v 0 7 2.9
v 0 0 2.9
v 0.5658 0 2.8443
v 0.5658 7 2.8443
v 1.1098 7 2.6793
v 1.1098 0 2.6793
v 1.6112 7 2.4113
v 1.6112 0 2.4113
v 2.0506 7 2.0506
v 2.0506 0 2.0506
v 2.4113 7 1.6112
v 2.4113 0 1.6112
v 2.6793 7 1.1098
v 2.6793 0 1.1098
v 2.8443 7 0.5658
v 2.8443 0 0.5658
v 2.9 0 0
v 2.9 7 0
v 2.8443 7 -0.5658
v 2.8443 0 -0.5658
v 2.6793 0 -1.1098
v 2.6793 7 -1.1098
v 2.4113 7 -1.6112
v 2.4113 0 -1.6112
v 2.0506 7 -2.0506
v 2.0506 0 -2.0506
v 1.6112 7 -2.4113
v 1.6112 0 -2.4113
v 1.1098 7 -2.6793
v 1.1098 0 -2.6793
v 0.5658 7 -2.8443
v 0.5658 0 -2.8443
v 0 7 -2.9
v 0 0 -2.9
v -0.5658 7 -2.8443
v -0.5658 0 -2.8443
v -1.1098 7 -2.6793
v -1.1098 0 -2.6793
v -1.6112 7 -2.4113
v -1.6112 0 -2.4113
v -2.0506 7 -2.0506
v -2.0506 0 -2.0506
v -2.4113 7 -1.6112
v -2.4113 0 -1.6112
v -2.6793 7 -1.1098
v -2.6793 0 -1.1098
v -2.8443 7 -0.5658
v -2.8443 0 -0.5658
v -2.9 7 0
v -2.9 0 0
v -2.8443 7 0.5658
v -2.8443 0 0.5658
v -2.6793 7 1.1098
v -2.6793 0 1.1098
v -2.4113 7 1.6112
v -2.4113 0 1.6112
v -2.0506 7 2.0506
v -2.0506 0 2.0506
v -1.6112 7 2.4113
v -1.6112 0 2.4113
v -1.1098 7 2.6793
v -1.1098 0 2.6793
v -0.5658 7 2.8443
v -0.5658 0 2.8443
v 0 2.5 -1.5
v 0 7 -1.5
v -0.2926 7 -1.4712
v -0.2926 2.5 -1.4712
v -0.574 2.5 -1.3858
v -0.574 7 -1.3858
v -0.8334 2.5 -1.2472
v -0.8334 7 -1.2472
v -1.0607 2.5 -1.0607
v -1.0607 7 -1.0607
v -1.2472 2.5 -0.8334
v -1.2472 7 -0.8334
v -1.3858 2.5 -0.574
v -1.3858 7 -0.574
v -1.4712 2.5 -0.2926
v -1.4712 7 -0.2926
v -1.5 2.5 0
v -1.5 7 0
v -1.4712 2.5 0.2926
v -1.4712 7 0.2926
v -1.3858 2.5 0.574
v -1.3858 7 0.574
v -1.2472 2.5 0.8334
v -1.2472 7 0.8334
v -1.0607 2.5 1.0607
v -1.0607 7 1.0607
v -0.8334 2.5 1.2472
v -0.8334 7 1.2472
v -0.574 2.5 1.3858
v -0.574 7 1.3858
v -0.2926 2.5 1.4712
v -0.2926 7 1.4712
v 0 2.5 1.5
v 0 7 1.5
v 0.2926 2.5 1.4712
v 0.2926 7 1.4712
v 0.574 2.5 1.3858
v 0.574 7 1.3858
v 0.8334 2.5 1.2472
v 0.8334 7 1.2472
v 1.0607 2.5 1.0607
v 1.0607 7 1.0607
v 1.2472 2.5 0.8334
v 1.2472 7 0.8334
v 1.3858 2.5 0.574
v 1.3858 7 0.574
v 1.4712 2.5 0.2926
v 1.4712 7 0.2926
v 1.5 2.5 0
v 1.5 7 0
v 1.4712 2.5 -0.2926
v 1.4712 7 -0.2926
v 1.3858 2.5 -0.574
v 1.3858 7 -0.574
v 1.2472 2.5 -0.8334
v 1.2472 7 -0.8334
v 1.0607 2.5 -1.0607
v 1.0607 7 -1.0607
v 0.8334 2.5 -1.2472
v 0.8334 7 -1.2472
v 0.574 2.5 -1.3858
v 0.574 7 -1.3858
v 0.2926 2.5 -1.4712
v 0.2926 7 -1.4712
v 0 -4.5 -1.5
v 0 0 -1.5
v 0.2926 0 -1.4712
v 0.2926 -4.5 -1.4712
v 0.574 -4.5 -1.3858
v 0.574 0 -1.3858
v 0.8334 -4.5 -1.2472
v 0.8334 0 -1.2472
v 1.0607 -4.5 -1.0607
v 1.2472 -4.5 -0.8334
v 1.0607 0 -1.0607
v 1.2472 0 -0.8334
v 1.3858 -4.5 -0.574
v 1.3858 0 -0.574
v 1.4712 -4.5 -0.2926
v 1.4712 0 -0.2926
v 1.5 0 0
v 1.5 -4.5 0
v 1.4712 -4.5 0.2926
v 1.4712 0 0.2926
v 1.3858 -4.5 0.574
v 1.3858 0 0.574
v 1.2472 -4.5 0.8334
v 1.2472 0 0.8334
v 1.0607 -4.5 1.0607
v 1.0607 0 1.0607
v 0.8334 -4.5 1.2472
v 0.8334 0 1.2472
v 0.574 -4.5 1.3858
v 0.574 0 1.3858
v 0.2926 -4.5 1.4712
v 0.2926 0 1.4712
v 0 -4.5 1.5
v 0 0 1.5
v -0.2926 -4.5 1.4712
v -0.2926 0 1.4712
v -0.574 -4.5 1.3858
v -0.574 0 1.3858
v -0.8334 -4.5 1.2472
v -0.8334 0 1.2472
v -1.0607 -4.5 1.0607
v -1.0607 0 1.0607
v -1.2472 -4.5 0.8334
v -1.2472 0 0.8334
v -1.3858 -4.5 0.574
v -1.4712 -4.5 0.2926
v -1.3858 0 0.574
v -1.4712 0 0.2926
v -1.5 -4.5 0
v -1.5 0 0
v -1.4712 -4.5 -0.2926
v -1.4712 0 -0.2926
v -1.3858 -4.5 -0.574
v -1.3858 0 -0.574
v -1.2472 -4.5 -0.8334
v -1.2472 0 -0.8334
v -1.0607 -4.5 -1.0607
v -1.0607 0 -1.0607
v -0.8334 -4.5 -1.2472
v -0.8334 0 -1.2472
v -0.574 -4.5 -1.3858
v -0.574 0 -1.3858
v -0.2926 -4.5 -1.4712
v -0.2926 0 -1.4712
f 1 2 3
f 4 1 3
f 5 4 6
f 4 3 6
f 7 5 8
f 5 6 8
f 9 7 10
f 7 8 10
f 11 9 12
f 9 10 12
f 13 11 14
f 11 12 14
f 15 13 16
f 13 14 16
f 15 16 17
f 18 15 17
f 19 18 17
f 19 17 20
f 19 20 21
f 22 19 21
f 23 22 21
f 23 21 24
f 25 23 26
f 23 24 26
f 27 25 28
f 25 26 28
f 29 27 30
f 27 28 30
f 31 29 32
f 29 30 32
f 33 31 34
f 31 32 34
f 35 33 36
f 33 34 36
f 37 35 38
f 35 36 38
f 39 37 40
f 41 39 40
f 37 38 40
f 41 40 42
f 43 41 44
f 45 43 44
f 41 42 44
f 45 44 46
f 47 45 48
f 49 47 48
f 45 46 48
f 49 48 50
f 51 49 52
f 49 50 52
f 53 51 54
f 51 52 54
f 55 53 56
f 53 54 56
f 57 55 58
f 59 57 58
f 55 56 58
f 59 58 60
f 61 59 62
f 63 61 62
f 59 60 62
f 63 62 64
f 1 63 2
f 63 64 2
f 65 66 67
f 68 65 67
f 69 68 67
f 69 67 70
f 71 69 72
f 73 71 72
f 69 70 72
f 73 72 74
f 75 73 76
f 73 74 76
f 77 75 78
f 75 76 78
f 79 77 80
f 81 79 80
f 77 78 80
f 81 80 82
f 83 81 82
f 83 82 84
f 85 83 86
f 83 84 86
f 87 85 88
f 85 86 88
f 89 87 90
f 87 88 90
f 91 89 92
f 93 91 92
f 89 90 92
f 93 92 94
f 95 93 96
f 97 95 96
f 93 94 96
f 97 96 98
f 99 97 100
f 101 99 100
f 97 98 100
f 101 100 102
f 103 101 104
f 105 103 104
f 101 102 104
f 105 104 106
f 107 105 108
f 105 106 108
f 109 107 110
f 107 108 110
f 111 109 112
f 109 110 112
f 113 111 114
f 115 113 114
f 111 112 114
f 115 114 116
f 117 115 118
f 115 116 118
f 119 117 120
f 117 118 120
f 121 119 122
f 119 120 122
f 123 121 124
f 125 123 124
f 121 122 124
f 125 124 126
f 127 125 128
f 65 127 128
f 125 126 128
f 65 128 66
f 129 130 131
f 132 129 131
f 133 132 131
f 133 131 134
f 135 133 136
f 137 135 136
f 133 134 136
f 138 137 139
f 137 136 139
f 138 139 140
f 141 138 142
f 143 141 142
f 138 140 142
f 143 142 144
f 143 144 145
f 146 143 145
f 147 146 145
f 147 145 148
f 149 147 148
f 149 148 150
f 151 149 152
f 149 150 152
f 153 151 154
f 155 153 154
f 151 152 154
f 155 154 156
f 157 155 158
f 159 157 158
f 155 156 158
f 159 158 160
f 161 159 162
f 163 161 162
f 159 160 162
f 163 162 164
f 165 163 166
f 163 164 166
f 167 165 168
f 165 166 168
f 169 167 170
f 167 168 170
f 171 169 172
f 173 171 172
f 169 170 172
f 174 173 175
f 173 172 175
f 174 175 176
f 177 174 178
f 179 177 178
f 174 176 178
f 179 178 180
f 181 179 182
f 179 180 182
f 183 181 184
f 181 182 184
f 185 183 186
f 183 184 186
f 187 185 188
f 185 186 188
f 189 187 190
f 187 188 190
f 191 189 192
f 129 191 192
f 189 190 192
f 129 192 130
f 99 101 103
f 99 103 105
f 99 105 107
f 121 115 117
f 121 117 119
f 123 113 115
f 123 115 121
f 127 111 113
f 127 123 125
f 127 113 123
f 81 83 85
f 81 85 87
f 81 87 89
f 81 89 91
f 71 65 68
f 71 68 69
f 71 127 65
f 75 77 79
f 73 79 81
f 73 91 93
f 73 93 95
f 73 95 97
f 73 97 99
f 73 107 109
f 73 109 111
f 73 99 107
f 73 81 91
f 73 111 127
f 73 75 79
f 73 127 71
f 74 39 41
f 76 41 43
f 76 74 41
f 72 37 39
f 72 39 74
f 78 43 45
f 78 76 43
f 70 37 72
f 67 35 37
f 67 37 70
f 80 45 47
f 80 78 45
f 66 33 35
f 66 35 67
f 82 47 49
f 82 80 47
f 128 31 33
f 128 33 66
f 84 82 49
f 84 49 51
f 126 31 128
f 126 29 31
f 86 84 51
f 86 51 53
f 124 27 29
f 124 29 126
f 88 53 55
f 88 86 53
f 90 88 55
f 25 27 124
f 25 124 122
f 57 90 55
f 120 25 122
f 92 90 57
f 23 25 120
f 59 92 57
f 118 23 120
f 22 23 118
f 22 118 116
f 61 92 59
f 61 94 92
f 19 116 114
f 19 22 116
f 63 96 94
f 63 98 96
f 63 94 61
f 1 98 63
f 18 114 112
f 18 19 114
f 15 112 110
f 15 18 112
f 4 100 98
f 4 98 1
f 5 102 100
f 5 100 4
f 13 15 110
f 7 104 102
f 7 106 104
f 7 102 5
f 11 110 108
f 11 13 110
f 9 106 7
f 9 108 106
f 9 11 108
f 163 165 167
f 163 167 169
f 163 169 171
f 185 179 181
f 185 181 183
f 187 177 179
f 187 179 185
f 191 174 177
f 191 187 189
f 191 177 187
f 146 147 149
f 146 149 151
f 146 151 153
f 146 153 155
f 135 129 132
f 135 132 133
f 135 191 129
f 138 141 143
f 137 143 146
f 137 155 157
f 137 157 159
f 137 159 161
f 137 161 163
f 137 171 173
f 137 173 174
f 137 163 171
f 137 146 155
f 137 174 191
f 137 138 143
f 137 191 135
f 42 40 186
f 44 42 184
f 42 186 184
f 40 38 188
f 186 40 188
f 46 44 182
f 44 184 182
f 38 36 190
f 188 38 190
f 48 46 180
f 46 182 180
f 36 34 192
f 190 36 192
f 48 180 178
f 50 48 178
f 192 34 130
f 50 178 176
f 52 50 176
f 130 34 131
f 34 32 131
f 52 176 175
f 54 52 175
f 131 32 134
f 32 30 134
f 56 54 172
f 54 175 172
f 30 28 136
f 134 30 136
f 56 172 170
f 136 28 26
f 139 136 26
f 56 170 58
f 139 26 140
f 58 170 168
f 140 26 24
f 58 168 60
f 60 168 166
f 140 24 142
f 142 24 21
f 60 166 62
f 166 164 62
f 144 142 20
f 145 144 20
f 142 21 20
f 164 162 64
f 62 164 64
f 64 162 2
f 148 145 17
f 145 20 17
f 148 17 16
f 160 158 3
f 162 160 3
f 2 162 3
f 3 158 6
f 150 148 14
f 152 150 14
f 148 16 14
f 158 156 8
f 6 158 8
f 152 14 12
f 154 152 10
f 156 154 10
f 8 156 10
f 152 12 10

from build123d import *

# Parameters (mm, degrees)
SKETCH1_R           = 2.9
BOSS_EXTRUDE1_DEPTH = 7
SKETCH2_R           = 1.5
BOSS_EXTRUDE2_DEPTH = 4.5
SKETCH3_R           = 1.5
CUT_EXTRUDE1_DEPTH  = 4.5


with BuildPart() as part:
    # Sketch1 → Boss-Extrude1 (new body)
    with BuildSketch(Plane(origin=(0, 0, 0), x_dir=(1, 0, 0), z_dir=(0, 1, 0))):
        with Locations(Location((0, 0, 0), (0, 0, 270))):
            Circle(SKETCH1_R)
    extrude(amount=BOSS_EXTRUDE1_DEPTH)

    # Sketch2 → Boss-Extrude2 (add)
    with BuildSketch(Plane.XZ):
        with Locations(Location((0, 0, 0), (0, 0, 270))):
            Circle(SKETCH2_R)
    extrude(amount=BOSS_EXTRUDE2_DEPTH)

    # Sketch3 → Cut-Extrude1 (cut)
    with BuildSketch(Plane(origin=(0, 7, 0), x_dir=(1, 0, 0), z_dir=(0, 1, 0))):
        with Locations(Location((0, 0, 0), (0, 0, 90))):
            Circle(SKETCH3_R)
    extrude(amount=-CUT_EXTRUDE1_DEPTH, mode=Mode.SUBTRACT)


solid = part.part
